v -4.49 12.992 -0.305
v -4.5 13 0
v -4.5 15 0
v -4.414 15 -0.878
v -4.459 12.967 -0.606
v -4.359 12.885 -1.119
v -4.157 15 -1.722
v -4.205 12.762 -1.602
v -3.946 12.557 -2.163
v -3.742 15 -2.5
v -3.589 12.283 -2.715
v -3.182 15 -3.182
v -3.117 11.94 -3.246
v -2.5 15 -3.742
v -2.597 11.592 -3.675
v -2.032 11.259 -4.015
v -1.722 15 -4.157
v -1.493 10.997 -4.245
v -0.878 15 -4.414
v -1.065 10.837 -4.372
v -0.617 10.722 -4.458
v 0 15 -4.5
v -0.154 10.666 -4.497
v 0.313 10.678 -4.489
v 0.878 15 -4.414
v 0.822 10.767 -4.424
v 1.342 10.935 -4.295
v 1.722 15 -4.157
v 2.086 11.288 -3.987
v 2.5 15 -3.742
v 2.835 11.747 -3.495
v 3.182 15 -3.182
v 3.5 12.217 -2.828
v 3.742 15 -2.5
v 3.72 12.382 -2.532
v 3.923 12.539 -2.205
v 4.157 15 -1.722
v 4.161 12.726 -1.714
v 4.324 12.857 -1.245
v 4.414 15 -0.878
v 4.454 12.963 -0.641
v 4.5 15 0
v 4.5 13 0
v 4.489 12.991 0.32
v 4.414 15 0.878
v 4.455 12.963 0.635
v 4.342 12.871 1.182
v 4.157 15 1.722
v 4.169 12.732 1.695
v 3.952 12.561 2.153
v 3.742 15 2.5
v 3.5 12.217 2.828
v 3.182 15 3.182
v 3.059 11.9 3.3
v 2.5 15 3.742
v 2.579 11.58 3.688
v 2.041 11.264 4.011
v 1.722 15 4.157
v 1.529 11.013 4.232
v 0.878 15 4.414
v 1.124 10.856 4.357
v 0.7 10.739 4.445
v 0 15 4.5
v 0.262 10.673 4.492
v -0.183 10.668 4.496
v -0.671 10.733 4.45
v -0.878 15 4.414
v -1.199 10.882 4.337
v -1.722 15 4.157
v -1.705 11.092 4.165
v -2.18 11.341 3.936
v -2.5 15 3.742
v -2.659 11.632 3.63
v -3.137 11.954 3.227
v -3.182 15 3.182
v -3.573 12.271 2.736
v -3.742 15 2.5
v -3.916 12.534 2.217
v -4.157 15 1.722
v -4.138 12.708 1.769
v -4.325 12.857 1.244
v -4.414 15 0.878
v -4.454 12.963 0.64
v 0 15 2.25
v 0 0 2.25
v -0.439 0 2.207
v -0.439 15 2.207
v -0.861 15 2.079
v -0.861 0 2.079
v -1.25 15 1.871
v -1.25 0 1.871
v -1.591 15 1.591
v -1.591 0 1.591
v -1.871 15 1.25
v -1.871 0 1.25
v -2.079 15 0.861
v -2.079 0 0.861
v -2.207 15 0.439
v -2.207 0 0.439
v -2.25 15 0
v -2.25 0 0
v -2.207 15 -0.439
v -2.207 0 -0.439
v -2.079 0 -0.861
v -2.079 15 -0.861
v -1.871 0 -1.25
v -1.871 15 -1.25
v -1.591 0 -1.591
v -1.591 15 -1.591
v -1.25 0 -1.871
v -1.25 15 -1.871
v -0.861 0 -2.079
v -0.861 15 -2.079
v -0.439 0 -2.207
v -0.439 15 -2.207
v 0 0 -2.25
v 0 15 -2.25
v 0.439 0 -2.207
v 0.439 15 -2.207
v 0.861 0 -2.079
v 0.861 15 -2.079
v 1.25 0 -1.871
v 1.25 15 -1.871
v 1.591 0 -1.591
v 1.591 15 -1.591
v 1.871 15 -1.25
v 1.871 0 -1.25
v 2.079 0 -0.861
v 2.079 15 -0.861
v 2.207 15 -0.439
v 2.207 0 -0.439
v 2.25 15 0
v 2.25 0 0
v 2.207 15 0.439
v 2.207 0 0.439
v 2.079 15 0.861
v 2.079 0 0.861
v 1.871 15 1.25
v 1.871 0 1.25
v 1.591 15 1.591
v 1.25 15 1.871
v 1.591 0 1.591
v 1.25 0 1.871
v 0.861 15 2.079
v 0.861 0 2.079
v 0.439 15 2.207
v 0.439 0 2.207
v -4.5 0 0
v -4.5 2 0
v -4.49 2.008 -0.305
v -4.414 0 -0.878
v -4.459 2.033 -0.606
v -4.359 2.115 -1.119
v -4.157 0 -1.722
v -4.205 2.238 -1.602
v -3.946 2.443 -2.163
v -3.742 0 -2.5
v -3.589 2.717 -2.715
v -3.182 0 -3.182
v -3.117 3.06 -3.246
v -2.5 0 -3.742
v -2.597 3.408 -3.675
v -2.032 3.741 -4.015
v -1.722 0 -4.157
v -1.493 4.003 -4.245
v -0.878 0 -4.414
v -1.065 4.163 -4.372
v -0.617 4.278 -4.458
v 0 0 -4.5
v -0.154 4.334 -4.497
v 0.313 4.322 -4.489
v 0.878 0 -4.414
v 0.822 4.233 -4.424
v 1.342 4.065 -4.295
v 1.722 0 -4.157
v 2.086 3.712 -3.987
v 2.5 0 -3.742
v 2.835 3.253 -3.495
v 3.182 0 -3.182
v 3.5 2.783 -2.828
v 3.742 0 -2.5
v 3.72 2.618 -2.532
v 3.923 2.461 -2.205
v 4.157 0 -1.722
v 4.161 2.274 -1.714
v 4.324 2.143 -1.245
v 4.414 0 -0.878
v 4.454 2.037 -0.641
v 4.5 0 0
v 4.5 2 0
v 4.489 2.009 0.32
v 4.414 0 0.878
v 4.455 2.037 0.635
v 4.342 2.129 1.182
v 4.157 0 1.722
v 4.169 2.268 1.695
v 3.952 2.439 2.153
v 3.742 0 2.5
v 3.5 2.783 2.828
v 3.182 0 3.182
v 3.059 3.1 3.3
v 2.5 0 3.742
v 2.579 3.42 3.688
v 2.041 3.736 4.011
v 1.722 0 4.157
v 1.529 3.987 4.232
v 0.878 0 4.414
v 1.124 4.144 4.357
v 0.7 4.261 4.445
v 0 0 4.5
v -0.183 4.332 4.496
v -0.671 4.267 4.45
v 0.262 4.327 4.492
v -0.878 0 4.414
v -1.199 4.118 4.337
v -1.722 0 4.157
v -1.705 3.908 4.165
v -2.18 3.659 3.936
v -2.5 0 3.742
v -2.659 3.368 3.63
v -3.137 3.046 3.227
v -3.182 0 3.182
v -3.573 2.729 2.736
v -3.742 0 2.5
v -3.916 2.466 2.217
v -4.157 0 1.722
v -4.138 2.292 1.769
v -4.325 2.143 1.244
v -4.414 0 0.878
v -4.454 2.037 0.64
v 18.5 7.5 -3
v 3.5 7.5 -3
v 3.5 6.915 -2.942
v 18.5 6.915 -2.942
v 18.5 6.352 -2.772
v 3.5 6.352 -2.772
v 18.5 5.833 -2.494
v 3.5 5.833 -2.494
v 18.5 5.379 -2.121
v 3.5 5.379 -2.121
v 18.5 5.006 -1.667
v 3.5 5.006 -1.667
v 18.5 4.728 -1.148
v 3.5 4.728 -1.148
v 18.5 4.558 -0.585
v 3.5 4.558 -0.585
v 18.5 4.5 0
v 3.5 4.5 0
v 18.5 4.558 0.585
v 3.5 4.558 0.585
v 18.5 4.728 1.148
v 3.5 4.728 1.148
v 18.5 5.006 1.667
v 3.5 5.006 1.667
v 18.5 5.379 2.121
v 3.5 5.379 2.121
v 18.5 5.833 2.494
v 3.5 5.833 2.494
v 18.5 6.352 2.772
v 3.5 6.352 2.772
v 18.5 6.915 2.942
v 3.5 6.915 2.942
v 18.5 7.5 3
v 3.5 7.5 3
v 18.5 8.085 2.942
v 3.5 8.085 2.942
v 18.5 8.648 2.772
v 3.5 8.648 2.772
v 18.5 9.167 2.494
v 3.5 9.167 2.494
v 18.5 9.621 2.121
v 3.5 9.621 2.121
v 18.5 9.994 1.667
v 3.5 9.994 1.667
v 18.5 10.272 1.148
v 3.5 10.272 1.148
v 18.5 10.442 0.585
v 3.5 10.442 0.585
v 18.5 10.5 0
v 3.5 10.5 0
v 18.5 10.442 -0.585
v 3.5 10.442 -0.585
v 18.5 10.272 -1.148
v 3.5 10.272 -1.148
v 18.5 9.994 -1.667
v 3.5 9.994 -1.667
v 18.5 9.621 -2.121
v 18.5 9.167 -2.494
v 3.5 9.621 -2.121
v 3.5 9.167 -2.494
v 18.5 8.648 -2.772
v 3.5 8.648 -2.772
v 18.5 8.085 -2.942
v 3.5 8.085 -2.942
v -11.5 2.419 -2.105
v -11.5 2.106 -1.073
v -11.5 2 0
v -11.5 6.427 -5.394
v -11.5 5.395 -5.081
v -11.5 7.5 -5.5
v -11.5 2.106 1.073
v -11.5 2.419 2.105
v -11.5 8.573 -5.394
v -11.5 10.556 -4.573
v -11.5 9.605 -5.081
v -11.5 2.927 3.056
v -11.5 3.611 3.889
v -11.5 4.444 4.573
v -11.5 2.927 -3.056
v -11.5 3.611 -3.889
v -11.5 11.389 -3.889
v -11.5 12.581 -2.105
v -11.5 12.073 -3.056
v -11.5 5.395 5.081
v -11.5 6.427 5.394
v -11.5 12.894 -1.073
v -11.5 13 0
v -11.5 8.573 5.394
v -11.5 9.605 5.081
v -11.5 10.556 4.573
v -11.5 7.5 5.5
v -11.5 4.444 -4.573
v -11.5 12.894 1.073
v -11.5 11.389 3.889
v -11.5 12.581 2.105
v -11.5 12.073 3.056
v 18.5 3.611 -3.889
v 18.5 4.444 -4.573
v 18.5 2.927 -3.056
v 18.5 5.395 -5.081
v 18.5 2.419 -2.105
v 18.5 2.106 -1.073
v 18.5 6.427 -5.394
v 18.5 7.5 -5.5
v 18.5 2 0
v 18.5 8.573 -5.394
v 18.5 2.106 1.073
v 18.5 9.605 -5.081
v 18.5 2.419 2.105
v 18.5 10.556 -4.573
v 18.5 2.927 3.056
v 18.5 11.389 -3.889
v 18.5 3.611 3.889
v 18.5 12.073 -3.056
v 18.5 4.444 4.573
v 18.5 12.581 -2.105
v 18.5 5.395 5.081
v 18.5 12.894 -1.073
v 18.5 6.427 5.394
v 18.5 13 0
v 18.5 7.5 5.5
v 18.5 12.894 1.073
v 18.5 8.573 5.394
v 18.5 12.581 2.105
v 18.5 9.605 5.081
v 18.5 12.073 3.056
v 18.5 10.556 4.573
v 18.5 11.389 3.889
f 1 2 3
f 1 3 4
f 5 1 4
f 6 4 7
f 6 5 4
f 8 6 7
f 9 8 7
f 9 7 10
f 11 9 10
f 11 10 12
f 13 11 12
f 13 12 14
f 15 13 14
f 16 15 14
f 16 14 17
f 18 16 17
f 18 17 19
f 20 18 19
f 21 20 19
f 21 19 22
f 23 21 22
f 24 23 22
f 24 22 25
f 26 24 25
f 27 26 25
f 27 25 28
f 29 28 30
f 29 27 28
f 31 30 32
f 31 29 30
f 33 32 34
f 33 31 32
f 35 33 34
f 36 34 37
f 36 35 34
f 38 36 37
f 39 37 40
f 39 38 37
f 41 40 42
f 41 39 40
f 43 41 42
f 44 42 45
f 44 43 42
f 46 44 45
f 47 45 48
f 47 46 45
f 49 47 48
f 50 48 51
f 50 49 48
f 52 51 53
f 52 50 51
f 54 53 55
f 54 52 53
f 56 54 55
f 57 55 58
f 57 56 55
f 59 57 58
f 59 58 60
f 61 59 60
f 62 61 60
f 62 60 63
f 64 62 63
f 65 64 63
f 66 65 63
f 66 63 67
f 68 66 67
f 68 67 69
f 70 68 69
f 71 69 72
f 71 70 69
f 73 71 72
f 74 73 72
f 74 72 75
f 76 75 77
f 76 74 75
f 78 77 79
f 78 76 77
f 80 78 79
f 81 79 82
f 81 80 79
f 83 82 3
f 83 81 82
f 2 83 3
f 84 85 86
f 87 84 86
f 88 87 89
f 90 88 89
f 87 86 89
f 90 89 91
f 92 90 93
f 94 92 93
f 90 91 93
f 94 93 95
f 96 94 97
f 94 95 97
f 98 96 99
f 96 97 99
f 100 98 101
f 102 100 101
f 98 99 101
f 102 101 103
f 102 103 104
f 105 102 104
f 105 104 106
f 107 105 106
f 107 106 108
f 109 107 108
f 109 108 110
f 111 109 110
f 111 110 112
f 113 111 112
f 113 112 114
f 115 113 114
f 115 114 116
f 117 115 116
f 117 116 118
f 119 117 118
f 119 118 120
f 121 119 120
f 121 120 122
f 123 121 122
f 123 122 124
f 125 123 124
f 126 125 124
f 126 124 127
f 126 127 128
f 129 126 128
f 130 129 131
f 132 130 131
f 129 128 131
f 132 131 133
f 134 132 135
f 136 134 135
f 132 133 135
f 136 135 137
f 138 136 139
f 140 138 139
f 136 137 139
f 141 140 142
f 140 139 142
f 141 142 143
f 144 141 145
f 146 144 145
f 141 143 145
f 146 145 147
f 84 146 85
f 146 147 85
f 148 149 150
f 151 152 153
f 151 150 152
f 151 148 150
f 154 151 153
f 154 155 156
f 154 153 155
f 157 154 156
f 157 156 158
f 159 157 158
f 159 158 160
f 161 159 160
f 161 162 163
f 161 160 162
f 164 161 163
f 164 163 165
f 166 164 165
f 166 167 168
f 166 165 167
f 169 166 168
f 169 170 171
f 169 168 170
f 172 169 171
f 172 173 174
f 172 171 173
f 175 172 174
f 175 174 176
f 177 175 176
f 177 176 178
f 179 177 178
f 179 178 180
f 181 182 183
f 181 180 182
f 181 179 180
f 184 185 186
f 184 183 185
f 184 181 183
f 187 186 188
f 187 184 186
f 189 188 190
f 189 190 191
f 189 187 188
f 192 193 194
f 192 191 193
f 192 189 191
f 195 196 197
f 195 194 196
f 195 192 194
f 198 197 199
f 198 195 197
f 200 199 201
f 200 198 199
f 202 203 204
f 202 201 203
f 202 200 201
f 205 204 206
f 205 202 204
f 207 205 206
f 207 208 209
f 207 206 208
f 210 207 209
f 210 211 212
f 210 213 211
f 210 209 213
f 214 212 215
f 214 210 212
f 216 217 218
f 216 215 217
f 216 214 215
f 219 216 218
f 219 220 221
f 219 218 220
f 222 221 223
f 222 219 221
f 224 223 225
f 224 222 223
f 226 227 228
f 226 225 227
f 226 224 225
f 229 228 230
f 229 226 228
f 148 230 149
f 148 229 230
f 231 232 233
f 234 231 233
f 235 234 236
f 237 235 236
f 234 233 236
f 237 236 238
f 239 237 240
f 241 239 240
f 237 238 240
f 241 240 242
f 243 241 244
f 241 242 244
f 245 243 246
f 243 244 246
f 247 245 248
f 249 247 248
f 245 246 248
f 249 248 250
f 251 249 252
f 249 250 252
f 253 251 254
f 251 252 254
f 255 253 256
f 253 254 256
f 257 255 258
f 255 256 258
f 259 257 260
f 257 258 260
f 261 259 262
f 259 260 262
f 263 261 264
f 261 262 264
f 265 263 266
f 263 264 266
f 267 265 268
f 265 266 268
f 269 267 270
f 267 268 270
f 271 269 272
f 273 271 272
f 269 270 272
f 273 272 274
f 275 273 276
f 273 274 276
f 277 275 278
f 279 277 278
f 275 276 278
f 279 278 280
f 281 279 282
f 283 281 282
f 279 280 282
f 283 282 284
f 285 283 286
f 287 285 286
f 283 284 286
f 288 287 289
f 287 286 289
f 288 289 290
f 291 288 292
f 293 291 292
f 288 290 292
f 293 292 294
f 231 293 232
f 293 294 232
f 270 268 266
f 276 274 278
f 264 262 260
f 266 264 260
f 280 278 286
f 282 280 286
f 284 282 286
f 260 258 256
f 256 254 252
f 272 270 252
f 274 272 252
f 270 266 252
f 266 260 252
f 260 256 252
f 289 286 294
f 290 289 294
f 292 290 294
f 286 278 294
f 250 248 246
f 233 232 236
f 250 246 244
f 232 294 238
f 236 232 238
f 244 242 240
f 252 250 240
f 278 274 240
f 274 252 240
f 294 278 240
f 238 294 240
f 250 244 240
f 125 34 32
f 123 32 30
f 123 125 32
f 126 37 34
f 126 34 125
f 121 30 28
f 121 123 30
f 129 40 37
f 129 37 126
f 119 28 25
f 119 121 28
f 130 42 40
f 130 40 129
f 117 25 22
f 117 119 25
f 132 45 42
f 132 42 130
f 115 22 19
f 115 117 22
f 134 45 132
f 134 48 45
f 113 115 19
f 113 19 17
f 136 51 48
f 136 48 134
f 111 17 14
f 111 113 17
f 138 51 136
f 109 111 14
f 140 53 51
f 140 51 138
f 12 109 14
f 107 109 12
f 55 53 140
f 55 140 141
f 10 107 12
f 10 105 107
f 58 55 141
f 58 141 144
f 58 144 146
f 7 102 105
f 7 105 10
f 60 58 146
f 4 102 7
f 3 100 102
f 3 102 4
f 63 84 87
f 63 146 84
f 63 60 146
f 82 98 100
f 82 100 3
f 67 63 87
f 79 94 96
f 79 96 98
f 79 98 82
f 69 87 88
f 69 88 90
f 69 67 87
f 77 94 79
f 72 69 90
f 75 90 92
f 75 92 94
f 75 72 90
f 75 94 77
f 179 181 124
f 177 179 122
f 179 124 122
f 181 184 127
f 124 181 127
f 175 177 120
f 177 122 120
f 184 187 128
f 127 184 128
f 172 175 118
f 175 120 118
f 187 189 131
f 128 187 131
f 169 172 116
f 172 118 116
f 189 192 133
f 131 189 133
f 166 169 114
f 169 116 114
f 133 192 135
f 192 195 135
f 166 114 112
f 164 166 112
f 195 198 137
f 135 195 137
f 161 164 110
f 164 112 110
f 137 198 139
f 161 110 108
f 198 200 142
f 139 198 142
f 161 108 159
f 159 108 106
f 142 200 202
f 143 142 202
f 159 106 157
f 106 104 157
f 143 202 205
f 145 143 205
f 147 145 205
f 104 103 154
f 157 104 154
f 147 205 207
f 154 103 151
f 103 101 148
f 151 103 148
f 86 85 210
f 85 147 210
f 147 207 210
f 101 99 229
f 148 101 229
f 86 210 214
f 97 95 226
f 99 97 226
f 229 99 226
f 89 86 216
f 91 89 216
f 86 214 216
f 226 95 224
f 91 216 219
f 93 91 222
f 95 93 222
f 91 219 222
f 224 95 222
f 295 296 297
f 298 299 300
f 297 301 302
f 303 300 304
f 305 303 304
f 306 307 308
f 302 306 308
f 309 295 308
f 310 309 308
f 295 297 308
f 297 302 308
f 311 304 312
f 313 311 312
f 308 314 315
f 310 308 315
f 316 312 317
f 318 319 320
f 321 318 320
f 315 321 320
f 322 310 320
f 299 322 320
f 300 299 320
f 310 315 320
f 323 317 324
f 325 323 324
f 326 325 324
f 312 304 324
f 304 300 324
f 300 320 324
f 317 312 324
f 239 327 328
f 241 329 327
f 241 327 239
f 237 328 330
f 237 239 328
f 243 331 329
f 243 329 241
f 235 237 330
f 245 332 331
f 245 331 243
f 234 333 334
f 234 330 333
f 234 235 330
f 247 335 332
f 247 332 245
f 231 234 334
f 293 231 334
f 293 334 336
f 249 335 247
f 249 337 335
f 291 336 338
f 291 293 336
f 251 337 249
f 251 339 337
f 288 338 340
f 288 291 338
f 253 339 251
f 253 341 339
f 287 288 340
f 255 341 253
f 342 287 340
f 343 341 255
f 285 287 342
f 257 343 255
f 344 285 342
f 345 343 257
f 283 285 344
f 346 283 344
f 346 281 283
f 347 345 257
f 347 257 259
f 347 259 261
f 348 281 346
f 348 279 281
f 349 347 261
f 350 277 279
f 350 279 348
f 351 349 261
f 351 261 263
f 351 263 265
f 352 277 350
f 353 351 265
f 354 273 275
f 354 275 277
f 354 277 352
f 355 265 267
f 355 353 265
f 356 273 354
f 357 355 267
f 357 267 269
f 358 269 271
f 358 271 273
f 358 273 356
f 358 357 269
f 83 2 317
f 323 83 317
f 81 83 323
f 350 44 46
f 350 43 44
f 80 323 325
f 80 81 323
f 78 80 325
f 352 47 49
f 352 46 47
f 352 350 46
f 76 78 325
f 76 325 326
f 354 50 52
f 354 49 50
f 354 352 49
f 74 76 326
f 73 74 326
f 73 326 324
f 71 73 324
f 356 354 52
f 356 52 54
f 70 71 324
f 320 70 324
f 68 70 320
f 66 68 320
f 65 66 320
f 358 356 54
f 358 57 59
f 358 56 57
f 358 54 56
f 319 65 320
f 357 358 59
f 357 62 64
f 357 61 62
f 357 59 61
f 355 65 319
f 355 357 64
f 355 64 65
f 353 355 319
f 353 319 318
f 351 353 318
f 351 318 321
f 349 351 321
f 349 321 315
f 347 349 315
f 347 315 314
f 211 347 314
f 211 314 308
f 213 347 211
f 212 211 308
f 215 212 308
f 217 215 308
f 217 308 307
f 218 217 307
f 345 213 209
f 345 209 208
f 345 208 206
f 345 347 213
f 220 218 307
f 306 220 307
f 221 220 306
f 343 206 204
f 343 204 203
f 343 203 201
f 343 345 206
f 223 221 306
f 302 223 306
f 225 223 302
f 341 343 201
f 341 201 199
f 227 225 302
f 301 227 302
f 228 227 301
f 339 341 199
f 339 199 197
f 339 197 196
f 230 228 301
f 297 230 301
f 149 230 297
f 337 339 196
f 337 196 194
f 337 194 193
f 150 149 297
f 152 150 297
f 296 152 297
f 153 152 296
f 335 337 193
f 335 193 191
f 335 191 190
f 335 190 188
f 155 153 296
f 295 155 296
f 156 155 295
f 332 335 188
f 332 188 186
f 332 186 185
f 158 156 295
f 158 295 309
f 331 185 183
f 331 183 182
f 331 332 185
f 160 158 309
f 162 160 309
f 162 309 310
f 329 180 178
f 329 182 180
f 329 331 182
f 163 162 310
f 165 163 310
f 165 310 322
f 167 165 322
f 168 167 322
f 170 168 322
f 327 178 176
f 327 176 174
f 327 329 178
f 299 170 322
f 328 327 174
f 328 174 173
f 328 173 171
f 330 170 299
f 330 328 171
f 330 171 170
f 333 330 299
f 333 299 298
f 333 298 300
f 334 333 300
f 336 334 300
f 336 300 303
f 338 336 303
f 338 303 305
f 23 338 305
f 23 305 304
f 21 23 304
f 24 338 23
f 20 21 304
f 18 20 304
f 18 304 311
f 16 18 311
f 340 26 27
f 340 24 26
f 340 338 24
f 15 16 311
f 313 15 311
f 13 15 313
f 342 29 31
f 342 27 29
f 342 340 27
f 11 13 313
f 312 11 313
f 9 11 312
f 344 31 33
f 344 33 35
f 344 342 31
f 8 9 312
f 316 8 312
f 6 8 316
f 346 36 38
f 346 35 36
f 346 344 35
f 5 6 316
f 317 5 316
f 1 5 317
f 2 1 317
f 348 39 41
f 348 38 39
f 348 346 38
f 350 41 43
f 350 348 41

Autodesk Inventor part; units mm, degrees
ref_plane "XZ Plane" through (0, 0, 0) normal (0, 1, 0) x (-1, 0, 0)
ref_plane "XY Plane" through (0, 0, 0) normal (0, 0, 1) x (1, 0, 0)
sketch "Sketch1" plane through (0, 0, 0) normal (0, 1, 0) x (-1, 0, 0)
  circle A0 centre (0, 0) radius 2.2
  circle A1 centre (0, 0) radius 4.5
  dimension "d0" = 4.4
  dimension "d1" = 9
extrude "Extrusion1" add sketch "Sketch1" along normal blind 15 contours A0 | A1
sketch "Sketch2" plane through (0, 15, 0) normal (0, 1, 0) x (1, 0, 0)
  circle A0 centre (0, 0) radius 2.2
  dimension "d4" = 4.4
ref_plane "Work Plane1" through (3.5, 0, 0) normal (1, 0, 0) x (0, 1, 0)
sketch "Sketch3" plane through (3.5, 0, 0) normal (1, 0, 0) x (0, 1, 0)
  line L0 (0, 0) -> (7.5, 0)
  circle A0 centre (7.5, 0) radius 5.5
  dimension "d13" = 7.5
  dimension "d15" = 11
extrude "Extrusion2" add sketch "Sketch3" along normal mid plane 30
sketch "Sketch6" plane through (-11.5, 0, 0) normal (-1, 0, 0) x (0, 0, 1)
  circle A0 centre (0, 7.5) radius 5.5 projected
  arc A1 (0, 11) -> (0, 4) centre (0, 7.5) ccw
  line L0 (0, 2) -> (0, 13) projected
  line L1 (0, 11) -> (0, 4)
  point P0 (0, 0)
sketch "Sketch7" plane through (18.5, 7.5, 0) normal (1, 0, 0) x (0, 0, -1)
  point P0 (0, -7.5)
hole "Hole4" at (0, 15, 0) direction (0, -1, 0) diameter 4.5 depth 20
sketch "Sketch8" plane through (18.5, 7.5, 0) normal (1, 0, 0) x (0, 0, -1)
  circle A0 centre (0, 0) radius 3
  point P0 (0, -7.5)
  dimension "d44" = 6
hole "Hole5" at (18.5, 7.5, 0) direction (-1, 0, 0) diameter 6 depth 15
properties part number "codo"
